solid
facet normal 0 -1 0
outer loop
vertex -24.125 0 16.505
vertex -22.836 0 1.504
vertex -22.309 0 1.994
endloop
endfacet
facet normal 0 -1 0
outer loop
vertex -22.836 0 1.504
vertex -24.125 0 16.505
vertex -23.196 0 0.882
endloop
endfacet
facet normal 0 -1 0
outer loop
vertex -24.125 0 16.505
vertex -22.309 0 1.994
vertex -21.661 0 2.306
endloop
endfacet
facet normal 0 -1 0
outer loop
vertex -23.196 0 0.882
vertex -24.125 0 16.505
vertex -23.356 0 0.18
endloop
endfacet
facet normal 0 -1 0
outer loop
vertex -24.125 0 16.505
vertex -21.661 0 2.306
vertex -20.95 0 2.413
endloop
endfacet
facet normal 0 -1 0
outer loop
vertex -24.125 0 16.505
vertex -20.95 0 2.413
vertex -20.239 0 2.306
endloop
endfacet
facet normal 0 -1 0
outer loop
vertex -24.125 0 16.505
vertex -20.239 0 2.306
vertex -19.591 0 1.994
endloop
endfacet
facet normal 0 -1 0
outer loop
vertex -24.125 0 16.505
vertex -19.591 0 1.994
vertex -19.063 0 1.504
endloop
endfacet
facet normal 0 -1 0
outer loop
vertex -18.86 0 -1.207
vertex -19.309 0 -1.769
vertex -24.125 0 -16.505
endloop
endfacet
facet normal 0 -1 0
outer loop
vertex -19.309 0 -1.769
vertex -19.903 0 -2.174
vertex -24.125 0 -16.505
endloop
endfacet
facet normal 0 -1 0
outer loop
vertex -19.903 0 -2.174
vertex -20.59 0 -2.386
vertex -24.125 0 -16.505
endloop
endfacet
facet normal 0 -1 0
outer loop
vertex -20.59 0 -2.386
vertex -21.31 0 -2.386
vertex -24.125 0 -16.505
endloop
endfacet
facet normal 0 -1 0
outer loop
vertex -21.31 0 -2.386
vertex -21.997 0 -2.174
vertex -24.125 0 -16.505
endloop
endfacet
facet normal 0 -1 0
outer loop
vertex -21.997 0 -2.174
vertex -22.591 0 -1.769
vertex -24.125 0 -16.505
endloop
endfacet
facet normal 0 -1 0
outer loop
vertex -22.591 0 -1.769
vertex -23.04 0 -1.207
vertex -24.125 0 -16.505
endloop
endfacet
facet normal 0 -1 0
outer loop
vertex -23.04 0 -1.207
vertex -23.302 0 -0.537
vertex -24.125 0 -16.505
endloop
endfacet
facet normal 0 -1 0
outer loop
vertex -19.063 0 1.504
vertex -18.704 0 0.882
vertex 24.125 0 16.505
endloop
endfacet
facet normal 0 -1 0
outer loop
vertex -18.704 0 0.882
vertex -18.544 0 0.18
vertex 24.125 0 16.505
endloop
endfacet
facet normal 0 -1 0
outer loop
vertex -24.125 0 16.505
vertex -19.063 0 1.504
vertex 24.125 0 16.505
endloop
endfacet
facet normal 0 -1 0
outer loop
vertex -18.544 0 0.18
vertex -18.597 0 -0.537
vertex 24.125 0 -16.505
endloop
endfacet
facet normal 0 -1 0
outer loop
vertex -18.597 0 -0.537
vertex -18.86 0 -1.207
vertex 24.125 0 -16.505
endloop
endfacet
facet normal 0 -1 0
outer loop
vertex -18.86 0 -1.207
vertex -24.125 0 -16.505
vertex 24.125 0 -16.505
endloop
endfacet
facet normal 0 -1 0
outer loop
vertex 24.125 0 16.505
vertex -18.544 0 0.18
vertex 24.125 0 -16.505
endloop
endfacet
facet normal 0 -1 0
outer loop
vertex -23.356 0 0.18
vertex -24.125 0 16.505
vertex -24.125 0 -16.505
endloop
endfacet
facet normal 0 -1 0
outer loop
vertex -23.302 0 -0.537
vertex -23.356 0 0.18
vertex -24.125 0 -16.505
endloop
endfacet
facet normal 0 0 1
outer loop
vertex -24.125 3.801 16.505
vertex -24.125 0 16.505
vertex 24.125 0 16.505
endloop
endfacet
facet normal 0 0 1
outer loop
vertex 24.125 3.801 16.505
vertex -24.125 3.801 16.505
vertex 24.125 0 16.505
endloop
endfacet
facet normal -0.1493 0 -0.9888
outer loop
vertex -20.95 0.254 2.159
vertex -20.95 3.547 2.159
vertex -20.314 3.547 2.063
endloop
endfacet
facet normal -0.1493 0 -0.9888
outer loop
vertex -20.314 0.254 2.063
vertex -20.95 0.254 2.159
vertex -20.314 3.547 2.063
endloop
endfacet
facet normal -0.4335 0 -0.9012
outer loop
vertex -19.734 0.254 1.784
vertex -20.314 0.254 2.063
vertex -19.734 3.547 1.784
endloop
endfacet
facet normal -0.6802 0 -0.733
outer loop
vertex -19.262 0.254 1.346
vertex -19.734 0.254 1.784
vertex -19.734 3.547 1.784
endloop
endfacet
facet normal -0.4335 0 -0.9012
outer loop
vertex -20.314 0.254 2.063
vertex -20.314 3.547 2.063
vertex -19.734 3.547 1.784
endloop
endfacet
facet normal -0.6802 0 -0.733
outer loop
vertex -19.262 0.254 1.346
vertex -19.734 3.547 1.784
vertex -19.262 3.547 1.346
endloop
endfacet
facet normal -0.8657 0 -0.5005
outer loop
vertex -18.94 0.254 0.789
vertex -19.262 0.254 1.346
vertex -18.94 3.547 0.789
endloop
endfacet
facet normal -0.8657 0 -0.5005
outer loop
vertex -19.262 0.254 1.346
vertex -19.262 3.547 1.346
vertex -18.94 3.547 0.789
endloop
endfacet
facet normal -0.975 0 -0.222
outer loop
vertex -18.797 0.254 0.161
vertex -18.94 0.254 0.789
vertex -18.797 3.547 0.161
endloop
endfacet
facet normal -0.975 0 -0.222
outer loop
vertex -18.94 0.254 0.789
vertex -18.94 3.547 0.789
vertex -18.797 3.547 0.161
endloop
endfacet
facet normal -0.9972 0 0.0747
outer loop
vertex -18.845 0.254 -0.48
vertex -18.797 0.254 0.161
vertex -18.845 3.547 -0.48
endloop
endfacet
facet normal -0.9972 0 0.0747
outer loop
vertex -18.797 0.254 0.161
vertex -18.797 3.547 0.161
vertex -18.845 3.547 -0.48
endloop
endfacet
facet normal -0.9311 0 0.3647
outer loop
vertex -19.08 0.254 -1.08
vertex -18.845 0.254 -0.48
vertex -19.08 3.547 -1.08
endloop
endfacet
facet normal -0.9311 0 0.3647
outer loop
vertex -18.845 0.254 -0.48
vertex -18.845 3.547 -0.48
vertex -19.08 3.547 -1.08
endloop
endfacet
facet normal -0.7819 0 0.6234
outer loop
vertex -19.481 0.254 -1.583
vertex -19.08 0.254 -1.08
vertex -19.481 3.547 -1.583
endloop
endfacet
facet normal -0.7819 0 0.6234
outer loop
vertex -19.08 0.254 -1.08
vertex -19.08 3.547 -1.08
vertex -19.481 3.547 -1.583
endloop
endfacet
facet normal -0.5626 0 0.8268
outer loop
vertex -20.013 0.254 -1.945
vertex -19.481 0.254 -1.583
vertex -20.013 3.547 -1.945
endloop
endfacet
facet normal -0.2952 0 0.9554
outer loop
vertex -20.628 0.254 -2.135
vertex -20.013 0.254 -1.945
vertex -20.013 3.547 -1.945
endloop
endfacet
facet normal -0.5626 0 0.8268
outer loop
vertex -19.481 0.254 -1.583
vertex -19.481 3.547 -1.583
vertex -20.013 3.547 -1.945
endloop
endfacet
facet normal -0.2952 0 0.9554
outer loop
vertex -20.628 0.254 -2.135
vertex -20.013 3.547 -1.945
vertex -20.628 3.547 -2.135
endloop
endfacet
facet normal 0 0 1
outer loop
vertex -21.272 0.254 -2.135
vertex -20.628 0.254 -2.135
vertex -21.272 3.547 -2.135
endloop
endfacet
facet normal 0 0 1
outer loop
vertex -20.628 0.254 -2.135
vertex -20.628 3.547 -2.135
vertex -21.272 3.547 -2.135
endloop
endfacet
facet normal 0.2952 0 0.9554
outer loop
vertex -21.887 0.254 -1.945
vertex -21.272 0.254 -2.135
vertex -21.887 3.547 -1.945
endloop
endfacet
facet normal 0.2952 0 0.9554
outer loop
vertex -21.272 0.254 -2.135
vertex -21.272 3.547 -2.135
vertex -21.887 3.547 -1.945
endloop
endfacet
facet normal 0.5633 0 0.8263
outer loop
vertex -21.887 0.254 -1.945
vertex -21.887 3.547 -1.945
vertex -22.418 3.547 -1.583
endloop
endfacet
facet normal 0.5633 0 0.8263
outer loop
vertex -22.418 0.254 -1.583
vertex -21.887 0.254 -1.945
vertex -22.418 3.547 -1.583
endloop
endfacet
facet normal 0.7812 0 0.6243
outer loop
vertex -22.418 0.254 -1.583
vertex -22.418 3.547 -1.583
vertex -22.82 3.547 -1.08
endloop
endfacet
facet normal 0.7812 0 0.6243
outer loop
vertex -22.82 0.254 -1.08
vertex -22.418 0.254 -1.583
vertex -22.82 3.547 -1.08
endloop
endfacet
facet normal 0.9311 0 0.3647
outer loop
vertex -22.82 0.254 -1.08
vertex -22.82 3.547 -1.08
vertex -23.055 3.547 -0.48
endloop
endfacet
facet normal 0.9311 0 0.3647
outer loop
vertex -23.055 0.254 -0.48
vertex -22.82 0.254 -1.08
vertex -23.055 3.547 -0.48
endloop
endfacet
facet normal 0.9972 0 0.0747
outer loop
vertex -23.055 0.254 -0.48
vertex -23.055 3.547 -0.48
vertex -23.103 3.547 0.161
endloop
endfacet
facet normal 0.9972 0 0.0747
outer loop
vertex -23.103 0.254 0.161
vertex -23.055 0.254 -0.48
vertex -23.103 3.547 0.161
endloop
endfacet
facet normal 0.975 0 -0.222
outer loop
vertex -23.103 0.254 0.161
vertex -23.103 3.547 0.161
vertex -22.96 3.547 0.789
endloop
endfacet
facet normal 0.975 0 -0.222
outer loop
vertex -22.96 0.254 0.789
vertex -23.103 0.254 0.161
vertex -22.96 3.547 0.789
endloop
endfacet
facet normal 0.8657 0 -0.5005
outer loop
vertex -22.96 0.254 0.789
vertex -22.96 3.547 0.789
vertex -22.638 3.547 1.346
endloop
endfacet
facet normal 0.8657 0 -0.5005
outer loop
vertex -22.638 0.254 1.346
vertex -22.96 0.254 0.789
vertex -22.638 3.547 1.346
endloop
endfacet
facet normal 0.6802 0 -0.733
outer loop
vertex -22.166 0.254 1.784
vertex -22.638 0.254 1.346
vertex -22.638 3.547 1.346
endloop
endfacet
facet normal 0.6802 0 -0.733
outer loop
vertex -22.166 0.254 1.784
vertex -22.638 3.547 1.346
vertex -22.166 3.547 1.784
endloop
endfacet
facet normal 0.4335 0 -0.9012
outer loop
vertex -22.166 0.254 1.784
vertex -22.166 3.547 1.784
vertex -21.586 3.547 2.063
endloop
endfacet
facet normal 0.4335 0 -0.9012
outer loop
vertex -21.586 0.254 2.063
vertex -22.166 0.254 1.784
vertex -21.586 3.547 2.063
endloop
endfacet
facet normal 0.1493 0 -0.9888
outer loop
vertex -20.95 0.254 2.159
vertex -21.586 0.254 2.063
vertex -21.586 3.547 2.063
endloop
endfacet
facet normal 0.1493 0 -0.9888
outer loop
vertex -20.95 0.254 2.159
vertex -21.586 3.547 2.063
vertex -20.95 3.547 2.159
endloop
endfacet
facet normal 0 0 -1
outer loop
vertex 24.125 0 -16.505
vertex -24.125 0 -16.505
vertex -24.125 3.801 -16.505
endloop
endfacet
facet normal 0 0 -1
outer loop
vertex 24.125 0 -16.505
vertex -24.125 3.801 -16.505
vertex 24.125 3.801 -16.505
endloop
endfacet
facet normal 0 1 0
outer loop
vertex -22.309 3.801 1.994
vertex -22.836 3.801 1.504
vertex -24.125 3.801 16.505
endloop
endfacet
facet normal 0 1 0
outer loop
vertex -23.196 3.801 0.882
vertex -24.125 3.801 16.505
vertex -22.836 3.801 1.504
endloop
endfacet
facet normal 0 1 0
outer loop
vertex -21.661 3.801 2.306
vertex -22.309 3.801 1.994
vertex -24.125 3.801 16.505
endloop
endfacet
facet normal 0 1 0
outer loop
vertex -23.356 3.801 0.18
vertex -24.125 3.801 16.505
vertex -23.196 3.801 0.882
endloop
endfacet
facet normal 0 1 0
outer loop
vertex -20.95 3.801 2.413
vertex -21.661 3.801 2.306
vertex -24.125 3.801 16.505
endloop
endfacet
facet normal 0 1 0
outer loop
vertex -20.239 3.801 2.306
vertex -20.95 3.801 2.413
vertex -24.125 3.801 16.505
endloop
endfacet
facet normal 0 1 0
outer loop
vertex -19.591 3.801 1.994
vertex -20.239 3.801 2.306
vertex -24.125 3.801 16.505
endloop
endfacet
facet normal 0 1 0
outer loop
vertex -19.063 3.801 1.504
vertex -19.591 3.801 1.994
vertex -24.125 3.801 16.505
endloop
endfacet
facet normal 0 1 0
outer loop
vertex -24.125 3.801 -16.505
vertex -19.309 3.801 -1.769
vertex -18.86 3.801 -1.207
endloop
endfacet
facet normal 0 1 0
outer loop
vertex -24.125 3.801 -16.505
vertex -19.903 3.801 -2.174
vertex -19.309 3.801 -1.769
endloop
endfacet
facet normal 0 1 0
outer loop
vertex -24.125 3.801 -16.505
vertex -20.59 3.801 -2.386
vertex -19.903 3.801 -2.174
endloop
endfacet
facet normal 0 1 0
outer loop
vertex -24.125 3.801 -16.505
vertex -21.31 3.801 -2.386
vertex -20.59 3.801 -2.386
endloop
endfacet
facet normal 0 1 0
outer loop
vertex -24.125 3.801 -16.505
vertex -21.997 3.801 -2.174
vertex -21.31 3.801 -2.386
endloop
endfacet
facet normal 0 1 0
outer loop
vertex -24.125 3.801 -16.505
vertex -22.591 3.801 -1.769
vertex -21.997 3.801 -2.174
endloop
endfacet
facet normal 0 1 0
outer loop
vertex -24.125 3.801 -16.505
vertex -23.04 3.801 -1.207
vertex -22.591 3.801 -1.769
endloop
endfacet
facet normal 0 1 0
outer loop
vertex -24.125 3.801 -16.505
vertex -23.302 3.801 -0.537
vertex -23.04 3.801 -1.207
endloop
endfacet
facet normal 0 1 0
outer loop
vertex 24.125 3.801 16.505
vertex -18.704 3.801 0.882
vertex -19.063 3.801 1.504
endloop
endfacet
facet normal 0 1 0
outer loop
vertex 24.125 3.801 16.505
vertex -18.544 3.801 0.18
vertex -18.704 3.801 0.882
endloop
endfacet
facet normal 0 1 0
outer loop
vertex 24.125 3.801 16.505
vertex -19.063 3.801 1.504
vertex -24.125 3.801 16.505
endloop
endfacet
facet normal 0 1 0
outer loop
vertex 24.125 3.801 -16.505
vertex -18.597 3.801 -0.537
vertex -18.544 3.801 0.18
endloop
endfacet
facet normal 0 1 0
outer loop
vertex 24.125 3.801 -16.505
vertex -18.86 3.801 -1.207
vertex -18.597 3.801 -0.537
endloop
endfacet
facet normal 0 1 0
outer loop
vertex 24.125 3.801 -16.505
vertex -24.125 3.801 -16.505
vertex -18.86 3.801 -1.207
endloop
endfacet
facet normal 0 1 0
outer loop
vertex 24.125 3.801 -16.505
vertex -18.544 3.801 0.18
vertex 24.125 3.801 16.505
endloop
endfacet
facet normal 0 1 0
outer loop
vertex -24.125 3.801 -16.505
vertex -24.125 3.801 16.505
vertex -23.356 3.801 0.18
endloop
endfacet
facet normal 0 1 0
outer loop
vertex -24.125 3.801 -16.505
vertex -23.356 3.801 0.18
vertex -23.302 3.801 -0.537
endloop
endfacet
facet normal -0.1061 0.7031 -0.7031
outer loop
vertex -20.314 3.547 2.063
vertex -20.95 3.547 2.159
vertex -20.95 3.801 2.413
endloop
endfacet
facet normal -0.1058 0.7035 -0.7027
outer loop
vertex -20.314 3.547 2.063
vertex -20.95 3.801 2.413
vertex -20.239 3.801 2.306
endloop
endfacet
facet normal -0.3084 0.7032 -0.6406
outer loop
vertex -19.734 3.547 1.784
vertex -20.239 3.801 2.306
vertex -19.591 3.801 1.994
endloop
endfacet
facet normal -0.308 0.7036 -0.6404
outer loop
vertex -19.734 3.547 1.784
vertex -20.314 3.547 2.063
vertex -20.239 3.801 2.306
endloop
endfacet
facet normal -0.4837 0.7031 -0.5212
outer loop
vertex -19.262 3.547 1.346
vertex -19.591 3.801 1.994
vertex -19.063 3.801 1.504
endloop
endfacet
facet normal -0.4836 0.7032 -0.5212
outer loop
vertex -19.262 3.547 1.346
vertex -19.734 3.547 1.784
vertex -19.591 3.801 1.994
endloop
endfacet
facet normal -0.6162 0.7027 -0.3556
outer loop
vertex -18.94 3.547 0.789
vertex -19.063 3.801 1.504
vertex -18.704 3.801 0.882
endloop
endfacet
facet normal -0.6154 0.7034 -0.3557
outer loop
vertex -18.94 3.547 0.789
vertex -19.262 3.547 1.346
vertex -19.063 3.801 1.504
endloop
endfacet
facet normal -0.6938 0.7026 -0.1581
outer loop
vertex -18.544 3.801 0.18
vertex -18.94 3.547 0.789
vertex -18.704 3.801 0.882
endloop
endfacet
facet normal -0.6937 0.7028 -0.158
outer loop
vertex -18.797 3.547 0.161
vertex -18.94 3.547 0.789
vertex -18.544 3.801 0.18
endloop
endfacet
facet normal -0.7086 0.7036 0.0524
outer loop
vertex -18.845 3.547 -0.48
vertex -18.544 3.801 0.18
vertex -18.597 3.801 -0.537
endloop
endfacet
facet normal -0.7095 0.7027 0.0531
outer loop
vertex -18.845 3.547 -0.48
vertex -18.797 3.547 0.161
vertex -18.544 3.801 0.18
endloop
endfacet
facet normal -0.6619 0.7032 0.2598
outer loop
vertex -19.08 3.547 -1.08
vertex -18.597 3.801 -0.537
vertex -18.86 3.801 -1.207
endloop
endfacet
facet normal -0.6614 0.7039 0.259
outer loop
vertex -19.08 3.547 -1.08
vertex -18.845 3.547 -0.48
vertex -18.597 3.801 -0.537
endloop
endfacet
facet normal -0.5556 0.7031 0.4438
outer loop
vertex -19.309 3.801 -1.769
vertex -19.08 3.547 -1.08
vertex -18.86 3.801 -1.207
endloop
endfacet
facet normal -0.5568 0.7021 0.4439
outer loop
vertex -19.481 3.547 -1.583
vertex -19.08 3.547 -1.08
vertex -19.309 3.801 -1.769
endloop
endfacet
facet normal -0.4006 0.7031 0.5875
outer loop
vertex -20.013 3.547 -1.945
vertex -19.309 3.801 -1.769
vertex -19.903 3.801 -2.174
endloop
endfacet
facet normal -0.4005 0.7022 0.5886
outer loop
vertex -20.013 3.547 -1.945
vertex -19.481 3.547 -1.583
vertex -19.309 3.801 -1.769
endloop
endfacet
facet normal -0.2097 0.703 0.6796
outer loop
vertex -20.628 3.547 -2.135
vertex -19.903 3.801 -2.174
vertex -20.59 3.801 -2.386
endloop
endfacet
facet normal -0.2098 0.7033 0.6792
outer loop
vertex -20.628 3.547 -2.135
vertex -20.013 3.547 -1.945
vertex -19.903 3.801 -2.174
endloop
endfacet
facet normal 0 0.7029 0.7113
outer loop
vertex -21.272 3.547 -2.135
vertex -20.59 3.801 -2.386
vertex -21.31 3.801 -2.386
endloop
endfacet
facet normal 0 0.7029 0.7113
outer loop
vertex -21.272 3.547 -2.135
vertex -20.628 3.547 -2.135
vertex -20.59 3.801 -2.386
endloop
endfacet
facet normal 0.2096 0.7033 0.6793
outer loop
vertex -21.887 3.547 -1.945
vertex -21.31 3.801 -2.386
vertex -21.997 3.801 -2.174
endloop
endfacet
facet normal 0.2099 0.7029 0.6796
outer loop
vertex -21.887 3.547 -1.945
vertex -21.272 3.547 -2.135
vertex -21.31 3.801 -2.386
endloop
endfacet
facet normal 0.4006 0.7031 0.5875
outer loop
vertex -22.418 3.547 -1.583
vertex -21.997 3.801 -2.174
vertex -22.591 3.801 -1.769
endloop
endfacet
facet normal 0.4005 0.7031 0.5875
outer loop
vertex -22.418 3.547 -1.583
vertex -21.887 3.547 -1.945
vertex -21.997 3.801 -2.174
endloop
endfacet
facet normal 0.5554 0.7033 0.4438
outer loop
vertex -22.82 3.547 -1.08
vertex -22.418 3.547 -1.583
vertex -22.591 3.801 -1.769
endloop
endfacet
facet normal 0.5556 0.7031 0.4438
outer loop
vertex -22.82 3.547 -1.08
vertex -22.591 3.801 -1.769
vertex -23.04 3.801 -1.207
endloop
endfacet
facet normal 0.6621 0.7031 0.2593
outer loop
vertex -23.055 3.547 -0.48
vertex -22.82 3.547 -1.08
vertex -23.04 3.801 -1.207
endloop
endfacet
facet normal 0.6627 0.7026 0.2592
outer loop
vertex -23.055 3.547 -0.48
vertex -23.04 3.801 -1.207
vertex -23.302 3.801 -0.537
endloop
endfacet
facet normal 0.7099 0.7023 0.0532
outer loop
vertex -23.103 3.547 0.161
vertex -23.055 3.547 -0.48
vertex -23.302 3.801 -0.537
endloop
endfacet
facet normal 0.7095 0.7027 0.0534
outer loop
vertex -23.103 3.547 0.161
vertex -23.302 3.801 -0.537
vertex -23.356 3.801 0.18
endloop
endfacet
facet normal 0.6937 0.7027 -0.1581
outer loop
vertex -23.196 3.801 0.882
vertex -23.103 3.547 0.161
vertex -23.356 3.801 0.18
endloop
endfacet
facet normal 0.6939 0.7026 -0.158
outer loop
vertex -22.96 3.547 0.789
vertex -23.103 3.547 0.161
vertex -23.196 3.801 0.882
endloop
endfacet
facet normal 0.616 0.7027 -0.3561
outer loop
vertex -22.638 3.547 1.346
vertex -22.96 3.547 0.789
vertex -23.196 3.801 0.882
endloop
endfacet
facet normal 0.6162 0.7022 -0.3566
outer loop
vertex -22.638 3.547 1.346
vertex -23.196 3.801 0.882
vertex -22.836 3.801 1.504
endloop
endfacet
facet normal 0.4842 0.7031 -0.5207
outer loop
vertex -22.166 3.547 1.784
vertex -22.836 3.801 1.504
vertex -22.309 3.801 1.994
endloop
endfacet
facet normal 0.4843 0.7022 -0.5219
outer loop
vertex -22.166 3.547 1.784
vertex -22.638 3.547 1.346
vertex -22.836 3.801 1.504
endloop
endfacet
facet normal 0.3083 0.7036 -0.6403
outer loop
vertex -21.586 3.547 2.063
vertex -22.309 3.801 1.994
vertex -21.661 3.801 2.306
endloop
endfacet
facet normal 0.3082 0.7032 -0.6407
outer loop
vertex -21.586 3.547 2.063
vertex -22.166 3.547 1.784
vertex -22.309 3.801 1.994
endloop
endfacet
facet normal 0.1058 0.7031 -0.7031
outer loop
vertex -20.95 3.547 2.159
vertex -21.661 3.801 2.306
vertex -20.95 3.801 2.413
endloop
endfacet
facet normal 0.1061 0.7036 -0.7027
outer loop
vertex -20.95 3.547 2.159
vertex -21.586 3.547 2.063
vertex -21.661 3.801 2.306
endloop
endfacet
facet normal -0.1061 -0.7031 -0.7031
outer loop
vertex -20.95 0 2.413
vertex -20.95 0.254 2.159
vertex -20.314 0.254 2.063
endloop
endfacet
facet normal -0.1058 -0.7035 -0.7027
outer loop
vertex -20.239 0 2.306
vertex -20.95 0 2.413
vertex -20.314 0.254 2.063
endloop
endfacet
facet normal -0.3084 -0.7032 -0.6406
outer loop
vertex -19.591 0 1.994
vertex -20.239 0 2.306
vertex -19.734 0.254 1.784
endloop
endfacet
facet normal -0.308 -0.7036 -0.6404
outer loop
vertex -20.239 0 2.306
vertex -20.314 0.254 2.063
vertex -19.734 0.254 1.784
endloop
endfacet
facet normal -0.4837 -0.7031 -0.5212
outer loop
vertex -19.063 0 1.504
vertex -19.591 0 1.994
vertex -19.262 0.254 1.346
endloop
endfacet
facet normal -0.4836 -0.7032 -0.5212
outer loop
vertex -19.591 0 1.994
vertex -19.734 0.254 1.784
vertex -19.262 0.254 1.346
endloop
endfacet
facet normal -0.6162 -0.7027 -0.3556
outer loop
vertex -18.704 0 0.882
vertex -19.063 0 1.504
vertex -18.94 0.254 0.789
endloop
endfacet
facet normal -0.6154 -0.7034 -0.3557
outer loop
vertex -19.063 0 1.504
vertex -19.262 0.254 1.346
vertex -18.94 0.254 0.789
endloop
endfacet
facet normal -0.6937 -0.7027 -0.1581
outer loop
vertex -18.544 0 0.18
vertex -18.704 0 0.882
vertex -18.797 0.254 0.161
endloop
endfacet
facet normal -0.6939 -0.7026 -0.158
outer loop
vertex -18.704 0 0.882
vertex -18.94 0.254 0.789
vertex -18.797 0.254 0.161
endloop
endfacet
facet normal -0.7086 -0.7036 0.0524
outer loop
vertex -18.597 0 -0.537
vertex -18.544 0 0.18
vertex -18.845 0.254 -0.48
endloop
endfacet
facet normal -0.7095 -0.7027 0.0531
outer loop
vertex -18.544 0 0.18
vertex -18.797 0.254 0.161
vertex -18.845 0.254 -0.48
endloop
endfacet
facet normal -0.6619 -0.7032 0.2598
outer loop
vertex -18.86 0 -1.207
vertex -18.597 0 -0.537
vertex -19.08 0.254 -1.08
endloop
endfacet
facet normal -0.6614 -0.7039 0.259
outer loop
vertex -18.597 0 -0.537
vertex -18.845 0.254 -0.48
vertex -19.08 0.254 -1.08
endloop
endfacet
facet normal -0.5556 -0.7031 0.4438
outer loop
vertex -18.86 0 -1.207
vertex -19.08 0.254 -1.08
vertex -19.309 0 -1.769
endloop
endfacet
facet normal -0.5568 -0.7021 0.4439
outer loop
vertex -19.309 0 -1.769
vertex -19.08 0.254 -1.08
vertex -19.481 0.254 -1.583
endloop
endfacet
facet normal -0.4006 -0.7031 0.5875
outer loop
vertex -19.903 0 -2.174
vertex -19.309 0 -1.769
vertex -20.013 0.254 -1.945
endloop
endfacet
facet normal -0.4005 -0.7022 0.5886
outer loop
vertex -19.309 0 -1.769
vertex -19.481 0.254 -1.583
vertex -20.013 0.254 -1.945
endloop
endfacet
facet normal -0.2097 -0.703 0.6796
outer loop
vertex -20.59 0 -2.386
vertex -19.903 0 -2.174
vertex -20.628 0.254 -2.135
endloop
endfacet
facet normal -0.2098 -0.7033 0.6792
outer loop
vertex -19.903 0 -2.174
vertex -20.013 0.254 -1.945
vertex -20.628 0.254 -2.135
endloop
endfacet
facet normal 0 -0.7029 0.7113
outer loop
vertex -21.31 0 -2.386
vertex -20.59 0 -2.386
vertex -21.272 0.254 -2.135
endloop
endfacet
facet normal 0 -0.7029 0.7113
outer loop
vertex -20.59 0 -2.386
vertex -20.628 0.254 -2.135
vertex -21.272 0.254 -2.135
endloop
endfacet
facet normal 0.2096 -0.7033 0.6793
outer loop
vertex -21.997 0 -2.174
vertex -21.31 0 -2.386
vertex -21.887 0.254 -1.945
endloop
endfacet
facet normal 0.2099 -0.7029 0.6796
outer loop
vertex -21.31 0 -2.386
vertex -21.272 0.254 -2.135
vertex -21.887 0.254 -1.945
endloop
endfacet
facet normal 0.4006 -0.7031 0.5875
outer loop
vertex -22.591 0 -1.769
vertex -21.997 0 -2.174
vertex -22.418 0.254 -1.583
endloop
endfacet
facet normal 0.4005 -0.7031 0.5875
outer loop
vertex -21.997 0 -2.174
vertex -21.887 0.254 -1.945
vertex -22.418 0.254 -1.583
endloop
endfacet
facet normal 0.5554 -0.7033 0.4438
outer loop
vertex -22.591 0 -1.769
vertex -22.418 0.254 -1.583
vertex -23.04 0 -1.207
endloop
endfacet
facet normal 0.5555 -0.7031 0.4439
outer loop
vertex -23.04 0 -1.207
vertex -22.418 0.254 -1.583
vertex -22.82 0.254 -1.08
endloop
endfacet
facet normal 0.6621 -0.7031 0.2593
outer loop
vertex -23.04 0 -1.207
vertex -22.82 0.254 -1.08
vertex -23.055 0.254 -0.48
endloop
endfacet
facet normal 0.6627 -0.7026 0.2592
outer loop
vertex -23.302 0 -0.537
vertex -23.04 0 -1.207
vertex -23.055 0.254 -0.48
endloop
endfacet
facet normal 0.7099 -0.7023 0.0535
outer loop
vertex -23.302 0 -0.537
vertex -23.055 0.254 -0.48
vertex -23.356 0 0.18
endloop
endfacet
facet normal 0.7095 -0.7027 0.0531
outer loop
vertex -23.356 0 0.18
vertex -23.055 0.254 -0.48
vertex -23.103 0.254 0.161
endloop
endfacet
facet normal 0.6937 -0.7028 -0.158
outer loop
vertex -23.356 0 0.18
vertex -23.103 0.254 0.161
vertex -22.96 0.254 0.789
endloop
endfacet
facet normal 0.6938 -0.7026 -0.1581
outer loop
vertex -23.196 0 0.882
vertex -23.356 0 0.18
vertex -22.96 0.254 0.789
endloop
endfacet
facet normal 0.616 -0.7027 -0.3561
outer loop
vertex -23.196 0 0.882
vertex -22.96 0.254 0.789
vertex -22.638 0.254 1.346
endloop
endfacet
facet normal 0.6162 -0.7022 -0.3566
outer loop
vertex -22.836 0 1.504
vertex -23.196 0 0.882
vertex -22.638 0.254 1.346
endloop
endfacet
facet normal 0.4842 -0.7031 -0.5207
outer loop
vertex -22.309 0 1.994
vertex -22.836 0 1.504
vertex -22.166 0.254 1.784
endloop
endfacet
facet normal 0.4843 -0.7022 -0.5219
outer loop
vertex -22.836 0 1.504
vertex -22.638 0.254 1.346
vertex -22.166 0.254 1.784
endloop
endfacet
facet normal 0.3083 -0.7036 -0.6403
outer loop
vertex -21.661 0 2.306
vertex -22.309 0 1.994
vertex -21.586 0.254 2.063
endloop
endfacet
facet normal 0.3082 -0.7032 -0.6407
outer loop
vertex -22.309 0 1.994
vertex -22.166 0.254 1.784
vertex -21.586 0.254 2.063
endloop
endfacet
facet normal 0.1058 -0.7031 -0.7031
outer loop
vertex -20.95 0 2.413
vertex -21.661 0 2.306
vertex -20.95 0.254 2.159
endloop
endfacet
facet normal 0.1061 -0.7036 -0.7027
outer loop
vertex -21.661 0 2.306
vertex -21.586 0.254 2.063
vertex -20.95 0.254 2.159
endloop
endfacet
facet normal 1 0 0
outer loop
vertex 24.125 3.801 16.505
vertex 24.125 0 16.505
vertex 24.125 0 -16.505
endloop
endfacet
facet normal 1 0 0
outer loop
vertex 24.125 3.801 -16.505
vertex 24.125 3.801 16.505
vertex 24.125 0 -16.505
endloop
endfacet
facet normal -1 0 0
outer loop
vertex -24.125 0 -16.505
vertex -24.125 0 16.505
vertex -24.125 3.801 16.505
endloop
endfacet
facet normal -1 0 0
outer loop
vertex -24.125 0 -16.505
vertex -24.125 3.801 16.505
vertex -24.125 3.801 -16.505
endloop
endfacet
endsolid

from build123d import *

# Parameters (mm, degrees)
SKETCH1_W           = 48.24984
SKETCH1_H           = 33.00984
BOSS_EXTRUDE1_DEPTH = 3.80111
CUT_EXTRUDE1_REACH  = 31.477
SKETCH2_R           = 2.159
CHAMFER1_SIZE       = 0.254


with BuildPart() as part:
    # Sketch1 → Boss-Extrude1 (new body)
    with BuildSketch(Plane(origin=(0, 0, 0), x_dir=(1, 0, 0), z_dir=(0, 1, 0))):
        Rectangle(SKETCH1_W, SKETCH1_H)
    extrude(amount=BOSS_EXTRUDE1_DEPTH)

    # Sketch2 → Cut-Extrude1 (cut, up to next)
    with BuildSketch(Plane(origin=(0, 3.80111, 0), x_dir=(1, 0, 0), z_dir=(0, 1, 0)), mode=Mode.PRIVATE) as cut_extrude1_sk1:
        with Locations(Location((-20.94992, 0, 0), (0, 0, 270))):
            Circle(SKETCH2_R)
    cut_extrude1_tool1 = extrude(cut_extrude1_sk1.sketch, amount=-CUT_EXTRUDE1_REACH, mode=Mode.PRIVATE) & part.part
    add(cut_extrude1_tool1.solids().sort_by_distance((-20.94992, 3.80111, 0))[0], mode=Mode.SUBTRACT)

    # Chamfer1
    chamfer1_edges = [part.edges().sort_by_distance(p)[0] for p in [
        (-20.94992, 0, -2.159),
        (-20.94992, 3.80111, -2.159),
    ]]
    chamfer(chamfer1_edges, length=CHAMFER1_SIZE)


solid = part.part
